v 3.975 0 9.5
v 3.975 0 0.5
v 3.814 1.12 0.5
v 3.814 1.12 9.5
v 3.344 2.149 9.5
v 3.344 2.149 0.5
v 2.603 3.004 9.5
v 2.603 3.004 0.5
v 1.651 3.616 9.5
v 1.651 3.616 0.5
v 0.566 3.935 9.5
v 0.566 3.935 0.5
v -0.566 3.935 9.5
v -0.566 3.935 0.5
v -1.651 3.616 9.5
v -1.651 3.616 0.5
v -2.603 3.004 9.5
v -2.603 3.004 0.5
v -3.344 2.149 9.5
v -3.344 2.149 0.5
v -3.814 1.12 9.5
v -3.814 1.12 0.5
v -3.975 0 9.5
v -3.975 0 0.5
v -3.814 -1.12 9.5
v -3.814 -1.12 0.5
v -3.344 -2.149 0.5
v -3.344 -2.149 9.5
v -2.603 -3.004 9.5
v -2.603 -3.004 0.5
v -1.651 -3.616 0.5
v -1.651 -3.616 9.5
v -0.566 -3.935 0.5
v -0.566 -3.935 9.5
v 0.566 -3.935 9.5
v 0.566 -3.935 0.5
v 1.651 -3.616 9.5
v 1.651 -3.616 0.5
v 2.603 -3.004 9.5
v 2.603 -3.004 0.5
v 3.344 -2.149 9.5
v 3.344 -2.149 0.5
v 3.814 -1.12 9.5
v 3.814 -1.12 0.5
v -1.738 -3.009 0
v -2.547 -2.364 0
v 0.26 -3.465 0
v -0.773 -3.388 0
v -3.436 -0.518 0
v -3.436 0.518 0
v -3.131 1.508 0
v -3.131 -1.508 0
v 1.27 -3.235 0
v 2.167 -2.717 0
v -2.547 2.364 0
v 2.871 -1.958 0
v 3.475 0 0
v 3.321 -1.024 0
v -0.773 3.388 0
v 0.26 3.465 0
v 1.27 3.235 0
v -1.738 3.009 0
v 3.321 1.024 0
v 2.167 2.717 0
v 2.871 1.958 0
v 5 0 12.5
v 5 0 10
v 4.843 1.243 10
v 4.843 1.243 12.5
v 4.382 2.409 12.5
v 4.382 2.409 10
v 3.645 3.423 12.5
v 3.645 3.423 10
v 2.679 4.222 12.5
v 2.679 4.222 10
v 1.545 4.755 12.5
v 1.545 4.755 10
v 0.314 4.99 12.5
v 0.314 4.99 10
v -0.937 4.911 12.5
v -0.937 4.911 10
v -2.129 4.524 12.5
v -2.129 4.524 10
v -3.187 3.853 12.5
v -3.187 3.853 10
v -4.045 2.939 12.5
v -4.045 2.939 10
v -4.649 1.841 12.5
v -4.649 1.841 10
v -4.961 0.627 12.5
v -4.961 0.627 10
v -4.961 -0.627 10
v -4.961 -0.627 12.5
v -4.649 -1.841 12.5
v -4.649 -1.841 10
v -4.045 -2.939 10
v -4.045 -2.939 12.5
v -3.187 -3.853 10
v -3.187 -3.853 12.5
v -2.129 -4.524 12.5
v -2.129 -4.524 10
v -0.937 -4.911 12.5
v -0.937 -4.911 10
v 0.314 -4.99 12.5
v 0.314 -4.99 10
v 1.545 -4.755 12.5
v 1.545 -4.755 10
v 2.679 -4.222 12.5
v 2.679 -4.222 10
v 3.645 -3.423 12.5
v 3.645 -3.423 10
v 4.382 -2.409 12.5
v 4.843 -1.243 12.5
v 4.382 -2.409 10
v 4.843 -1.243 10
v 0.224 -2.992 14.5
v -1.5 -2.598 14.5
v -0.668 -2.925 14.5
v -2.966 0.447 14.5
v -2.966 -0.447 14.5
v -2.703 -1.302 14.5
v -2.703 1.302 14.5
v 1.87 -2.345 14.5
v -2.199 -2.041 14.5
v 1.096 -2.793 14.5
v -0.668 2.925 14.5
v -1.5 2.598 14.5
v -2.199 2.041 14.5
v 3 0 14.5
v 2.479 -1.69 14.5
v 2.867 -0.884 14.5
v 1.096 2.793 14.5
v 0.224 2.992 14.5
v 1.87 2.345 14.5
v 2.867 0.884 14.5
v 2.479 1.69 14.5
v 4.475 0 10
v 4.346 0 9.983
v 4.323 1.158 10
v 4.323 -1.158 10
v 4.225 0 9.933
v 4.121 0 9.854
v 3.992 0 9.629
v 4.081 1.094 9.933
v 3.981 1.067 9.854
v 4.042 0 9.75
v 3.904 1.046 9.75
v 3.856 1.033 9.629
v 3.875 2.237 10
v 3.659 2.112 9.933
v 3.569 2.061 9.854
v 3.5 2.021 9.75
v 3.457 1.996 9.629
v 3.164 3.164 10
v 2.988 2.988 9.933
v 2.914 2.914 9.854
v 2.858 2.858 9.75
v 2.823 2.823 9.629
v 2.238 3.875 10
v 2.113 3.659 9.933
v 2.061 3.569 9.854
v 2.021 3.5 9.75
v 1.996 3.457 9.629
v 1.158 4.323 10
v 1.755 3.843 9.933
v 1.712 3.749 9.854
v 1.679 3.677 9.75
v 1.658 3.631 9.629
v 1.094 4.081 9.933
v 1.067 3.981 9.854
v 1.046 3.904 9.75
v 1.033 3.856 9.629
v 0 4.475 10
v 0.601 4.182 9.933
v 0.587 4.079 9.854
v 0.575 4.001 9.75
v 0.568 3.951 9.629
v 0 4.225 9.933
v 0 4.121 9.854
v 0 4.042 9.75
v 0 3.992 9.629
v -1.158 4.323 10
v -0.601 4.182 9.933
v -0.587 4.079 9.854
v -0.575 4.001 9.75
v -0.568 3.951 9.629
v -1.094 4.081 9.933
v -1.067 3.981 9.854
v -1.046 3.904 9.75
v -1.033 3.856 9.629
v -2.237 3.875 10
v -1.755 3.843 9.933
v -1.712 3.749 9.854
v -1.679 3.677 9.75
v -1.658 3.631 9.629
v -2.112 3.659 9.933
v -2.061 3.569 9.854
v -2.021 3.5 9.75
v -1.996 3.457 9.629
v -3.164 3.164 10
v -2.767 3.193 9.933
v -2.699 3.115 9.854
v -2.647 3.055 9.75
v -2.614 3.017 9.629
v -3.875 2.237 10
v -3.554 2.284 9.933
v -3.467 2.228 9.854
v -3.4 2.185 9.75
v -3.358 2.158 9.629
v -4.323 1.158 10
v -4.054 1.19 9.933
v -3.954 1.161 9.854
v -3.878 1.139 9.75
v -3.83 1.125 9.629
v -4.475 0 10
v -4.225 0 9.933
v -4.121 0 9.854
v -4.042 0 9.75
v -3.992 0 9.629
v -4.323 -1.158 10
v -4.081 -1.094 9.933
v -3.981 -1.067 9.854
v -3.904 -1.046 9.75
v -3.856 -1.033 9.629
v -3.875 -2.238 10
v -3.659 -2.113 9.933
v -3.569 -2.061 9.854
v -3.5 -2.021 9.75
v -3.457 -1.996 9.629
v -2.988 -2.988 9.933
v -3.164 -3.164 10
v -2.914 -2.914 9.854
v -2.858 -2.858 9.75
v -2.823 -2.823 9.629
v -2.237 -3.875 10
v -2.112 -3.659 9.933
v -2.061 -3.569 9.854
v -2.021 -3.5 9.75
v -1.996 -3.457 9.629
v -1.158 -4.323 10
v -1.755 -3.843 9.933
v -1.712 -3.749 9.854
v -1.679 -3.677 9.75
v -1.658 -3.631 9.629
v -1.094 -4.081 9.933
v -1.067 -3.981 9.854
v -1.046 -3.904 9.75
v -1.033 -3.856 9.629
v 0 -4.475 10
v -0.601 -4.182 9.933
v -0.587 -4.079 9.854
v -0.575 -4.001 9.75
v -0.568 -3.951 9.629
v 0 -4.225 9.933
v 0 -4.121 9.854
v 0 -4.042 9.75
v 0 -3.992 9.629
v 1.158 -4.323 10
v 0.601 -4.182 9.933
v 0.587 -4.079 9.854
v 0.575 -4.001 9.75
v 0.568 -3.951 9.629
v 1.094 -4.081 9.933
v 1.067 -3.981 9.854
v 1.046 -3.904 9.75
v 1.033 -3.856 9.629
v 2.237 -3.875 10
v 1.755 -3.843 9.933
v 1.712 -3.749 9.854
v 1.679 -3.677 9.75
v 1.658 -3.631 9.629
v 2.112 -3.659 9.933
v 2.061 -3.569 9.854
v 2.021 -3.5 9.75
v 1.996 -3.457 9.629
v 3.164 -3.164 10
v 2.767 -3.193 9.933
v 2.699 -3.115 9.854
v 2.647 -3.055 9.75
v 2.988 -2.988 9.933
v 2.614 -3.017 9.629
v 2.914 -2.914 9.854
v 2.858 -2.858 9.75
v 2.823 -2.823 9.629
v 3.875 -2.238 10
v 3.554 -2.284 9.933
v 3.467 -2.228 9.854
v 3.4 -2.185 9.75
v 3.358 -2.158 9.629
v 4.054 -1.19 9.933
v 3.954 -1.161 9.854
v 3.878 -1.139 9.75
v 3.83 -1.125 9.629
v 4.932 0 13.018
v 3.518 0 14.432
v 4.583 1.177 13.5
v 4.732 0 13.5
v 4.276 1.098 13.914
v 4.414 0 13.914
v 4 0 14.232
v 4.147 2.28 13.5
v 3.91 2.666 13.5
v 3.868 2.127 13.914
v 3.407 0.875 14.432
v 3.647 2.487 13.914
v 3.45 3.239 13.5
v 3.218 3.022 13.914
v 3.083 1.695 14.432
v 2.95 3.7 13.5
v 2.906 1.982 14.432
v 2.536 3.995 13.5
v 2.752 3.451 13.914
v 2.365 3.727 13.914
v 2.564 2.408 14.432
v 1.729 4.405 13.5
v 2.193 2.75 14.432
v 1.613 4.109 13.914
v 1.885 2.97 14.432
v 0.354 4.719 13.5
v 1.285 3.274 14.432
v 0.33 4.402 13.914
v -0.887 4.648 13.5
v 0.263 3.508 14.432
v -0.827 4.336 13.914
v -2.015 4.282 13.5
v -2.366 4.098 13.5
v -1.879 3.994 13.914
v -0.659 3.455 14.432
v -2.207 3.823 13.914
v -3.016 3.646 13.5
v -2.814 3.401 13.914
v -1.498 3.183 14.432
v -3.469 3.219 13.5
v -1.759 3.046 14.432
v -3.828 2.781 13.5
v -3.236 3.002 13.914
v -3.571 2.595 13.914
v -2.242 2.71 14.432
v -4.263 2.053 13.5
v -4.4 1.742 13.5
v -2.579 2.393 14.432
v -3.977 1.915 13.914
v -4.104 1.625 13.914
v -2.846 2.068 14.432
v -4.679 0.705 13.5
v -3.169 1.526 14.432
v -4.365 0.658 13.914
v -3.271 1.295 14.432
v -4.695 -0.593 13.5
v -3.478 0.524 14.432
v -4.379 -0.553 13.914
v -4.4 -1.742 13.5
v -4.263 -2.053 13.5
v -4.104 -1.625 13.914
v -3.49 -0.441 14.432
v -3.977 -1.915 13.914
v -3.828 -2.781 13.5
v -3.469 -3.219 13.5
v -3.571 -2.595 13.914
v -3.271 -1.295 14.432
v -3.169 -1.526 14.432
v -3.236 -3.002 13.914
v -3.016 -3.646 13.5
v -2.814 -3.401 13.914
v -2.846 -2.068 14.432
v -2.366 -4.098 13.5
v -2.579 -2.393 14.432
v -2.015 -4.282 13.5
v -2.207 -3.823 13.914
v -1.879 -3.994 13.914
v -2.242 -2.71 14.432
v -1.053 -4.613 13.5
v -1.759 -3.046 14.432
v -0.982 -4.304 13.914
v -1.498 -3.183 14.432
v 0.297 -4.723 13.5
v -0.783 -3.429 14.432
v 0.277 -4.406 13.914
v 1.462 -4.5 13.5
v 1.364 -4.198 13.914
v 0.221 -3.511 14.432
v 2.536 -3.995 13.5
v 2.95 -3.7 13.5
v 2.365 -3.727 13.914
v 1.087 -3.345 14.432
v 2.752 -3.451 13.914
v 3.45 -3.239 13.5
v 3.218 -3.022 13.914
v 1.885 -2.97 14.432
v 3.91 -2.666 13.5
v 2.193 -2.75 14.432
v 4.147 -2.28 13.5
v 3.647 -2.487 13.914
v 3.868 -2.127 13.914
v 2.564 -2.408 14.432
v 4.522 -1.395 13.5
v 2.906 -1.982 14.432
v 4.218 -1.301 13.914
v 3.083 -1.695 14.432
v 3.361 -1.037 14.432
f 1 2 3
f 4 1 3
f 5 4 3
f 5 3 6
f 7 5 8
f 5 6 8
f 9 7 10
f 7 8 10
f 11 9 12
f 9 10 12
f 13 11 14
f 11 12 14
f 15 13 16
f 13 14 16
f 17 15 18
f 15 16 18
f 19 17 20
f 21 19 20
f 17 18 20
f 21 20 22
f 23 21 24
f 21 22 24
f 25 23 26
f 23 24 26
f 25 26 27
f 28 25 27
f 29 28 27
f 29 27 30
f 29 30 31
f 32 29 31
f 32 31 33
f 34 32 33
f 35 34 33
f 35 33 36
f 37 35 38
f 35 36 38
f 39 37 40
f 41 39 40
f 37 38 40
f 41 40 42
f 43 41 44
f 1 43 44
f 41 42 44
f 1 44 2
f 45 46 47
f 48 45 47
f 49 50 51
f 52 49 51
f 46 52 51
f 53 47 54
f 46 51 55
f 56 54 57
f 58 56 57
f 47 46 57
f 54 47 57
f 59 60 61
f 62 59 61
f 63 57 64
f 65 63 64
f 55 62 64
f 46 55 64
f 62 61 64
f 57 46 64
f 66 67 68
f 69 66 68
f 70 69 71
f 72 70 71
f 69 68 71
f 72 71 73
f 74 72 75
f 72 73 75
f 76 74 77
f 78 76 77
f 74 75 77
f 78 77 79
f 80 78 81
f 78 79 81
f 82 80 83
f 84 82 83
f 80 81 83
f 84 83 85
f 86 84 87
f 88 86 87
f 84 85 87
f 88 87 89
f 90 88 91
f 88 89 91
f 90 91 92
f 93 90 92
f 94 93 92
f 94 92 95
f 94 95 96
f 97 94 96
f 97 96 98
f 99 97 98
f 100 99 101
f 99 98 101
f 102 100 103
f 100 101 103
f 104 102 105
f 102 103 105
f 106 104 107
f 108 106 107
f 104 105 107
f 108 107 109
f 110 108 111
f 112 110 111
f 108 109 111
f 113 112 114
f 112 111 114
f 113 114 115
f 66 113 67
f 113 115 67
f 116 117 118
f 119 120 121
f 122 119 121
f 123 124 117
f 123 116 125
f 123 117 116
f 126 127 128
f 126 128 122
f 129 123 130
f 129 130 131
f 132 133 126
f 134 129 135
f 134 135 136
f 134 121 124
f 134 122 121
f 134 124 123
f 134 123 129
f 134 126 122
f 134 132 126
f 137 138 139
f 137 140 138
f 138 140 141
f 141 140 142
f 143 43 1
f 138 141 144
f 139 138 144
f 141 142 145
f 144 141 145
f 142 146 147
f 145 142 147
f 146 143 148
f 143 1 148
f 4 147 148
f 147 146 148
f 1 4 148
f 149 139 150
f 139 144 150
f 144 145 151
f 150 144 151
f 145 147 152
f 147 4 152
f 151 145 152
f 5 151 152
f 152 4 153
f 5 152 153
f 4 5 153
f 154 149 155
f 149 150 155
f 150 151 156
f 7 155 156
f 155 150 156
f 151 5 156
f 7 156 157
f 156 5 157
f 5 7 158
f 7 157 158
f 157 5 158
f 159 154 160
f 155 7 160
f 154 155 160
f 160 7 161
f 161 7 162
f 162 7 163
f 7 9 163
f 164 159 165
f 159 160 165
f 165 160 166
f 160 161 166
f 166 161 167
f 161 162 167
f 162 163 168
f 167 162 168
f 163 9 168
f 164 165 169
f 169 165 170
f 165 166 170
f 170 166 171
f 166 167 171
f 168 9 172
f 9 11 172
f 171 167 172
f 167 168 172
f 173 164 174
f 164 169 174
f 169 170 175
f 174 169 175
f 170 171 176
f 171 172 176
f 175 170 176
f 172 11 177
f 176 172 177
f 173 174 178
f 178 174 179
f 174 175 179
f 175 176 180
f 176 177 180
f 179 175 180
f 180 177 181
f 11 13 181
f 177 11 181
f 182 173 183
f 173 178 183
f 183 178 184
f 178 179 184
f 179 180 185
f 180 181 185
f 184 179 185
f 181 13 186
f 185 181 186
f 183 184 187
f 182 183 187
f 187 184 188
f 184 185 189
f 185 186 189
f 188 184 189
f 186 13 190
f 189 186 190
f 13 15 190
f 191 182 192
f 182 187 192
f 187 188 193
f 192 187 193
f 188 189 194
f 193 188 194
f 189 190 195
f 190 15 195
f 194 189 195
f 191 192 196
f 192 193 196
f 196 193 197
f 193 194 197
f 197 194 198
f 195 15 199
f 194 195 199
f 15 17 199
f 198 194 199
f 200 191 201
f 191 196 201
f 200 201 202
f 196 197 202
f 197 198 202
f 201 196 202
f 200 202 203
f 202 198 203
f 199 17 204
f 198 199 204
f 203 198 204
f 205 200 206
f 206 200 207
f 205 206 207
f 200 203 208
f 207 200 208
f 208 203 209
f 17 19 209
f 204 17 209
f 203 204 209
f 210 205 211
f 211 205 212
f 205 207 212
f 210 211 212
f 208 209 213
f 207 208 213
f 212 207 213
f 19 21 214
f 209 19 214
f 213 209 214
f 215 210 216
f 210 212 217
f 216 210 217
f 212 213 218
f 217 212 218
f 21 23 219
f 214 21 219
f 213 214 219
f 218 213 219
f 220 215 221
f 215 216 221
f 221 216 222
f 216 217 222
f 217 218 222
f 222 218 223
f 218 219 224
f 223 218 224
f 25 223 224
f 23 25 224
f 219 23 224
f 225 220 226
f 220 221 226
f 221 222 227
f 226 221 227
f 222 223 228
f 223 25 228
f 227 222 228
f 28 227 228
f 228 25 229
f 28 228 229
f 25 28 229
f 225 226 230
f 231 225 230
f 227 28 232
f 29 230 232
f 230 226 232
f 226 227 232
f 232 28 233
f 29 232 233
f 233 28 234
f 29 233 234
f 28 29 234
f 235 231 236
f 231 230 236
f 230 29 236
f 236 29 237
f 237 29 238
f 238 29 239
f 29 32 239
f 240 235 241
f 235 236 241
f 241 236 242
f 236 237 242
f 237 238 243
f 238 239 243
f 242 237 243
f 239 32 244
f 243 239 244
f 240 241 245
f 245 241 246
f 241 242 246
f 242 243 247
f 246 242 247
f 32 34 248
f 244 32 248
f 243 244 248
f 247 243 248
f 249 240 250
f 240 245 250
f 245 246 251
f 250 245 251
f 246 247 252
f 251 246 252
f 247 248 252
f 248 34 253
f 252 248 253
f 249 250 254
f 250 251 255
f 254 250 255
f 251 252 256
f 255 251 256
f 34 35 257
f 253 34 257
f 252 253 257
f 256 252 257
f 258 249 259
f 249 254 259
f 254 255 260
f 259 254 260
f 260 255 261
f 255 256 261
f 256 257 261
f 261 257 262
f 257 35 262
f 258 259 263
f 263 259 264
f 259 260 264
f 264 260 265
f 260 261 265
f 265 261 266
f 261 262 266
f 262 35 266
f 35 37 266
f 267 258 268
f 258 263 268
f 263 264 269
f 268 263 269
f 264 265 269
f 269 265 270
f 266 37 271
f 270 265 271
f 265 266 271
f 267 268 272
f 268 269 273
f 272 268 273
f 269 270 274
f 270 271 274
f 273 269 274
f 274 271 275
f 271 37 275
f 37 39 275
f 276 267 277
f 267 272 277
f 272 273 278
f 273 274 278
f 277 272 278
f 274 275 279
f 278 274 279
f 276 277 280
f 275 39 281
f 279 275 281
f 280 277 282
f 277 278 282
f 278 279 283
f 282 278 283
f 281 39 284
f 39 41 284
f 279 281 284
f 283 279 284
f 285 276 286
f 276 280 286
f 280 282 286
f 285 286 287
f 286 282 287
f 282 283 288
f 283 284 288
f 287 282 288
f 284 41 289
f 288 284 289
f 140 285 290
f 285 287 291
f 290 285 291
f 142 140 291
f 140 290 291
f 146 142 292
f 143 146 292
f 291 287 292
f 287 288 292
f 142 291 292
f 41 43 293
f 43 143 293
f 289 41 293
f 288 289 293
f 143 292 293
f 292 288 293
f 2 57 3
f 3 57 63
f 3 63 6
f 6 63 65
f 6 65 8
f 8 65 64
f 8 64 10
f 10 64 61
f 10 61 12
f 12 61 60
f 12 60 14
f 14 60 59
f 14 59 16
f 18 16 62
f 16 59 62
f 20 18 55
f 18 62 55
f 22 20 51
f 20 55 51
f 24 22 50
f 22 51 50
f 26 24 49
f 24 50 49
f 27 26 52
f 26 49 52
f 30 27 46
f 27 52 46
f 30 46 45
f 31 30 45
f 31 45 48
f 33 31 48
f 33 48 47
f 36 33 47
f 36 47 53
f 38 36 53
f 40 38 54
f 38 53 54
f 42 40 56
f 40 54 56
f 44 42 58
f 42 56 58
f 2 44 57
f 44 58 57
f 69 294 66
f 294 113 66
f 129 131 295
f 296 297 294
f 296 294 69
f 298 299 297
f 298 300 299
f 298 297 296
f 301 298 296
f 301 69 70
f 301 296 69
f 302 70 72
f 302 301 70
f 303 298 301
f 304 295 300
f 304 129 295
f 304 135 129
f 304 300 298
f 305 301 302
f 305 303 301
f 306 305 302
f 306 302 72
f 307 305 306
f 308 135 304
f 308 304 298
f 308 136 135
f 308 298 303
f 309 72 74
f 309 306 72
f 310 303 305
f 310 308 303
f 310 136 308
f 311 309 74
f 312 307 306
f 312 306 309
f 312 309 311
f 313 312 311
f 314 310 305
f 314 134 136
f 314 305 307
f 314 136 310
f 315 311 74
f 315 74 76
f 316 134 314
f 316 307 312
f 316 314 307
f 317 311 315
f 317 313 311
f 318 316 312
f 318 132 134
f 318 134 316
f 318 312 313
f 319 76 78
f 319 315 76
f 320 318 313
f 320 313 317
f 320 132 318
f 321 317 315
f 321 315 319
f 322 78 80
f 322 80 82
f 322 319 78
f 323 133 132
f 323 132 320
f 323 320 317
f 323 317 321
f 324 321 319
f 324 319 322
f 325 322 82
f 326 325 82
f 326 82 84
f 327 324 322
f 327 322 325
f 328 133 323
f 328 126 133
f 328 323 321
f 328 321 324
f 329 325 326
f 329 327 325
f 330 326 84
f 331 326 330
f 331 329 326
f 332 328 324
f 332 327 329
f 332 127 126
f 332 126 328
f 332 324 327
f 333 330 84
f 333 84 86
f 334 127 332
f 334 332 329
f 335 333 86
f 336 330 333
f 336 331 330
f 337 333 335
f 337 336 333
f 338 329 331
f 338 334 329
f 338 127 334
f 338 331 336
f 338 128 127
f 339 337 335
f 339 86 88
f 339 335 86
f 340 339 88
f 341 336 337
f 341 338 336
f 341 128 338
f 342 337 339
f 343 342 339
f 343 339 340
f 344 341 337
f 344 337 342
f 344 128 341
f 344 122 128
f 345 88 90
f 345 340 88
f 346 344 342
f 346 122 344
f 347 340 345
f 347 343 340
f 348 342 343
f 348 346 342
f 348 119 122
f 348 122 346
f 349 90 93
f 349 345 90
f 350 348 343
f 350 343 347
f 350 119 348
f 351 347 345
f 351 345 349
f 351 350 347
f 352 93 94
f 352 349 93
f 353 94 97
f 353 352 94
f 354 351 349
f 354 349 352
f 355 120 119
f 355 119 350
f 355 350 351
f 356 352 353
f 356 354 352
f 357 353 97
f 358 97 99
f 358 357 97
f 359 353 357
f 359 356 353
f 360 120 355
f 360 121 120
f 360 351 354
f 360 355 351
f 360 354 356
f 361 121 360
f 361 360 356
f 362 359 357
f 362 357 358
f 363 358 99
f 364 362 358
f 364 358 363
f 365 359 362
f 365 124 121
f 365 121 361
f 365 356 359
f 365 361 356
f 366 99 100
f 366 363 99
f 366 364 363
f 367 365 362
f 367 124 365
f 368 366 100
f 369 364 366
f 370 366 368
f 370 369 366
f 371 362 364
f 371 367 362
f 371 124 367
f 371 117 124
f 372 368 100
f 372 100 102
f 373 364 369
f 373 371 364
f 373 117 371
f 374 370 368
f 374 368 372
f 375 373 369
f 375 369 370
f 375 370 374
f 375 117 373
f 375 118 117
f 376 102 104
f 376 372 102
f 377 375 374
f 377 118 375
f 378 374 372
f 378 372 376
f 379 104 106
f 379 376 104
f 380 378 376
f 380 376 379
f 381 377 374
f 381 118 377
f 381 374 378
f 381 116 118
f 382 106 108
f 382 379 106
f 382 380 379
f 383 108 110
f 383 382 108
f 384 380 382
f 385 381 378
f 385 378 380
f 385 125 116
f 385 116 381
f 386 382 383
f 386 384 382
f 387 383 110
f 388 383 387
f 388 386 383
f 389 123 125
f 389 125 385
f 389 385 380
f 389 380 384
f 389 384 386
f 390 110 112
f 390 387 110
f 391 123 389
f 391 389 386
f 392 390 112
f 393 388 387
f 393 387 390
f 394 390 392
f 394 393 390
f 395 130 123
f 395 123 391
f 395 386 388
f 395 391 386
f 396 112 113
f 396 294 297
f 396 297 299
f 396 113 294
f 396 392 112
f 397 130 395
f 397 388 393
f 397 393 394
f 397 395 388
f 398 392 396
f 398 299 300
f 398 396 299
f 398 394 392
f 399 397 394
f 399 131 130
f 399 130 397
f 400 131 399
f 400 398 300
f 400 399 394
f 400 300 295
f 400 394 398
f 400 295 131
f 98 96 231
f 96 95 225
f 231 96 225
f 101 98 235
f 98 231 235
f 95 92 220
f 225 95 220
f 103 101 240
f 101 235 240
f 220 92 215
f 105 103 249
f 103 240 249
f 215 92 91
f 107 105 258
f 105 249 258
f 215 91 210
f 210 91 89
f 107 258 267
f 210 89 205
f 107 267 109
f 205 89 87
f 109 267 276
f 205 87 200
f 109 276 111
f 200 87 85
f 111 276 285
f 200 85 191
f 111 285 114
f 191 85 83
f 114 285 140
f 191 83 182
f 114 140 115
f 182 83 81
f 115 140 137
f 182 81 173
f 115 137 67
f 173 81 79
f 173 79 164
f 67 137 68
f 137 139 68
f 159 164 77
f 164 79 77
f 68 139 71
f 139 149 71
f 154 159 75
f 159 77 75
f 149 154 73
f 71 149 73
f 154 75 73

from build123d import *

# Parameters (mm, degrees)
SKETCH1_R           = 3.975
BOSS_EXTRUDE1_DEPTH = 10
SKETCH2_R           = 5
BOSS_EXTRUDE2_DEPTH = 4.5
FILLET4_R           = 2
FILLET5_R           = 0.5
CHAMFER1_SIZE       = 0.5


with BuildPart() as part:
    # Sketch1 → Boss-Extrude1 (new body)
    with BuildSketch(Plane.XY):
        Circle(SKETCH1_R)
    extrude(amount=BOSS_EXTRUDE1_DEPTH)

    # Sketch2 → Boss-Extrude2 (add)
    with BuildSketch(Plane.XY.offset(10)):
        Circle(SKETCH2_R)
    extrude(amount=BOSS_EXTRUDE2_DEPTH)

    # Fillet4
    fillet4_edges = [part.edges().sort_by_distance(p)[0] for p in [
        (-5, 0, 14.5),
    ]]
    fillet(fillet4_edges, radius=FILLET4_R)

    # Fillet5
    fillet5_edges = [part.edges().sort_by_distance(p)[0] for p in [
        (-3.975, 0, 10),
    ]]
    fillet(fillet5_edges, radius=FILLET5_R)

    # Chamfer1
    chamfer1_edges = [part.edges().sort_by_distance(p)[0] for p in [
        (-3.975, 0, 0),
    ]]
    chamfer(chamfer1_edges, length=CHAMFER1_SIZE)


solid = part.part
